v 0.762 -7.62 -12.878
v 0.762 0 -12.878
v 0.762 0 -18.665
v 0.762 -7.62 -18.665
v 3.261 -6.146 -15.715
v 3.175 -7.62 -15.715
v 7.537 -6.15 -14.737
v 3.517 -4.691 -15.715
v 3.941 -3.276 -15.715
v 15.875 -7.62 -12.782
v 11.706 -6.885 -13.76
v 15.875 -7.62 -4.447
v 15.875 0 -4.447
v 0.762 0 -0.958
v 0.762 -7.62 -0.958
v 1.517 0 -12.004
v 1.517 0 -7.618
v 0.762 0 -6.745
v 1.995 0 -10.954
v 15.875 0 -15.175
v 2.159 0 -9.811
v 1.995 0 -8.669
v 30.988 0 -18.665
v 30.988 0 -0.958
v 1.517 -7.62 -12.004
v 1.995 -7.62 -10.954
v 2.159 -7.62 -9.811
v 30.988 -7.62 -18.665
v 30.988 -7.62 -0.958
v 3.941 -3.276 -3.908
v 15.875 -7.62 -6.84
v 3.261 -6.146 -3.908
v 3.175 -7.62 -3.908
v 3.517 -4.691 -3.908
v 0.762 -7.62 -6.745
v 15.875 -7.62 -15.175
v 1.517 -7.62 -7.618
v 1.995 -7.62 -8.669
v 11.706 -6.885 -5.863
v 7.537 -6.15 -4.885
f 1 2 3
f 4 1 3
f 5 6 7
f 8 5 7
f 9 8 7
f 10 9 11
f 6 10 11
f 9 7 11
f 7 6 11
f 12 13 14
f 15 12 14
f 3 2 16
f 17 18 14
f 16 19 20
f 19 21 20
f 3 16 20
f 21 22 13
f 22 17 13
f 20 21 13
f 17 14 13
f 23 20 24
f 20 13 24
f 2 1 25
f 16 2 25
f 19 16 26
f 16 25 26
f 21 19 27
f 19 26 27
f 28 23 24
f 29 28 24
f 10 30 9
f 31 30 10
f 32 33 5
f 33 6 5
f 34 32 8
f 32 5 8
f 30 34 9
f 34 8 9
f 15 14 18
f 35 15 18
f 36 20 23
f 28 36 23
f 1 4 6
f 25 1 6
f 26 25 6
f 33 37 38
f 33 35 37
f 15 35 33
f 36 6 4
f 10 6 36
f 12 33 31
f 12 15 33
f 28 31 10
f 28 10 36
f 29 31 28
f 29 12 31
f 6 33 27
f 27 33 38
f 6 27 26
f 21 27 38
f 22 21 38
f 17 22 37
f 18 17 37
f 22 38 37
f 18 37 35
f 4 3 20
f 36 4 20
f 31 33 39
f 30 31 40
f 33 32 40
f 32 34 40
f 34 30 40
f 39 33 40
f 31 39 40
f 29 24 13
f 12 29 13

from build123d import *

# Parameters (mm, degrees)
F1_DEPTH = 7.62
F2_W     = 12.7
F2_H     = 5.9424509318
F3_ANGLE = 20
F5_DEPTH = 25.4
F7_DEPTH = 25.4


with BuildPart() as f1:
    # F0 (on Front) → F1 (new body)
    with BuildSketch(Plane.XZ):
        Polygon((15.875, -3.6650325341), (0, 0), (0, -19.622516), (15.875, -15.9574834659), align=None)
        Polygon((31.75, 0), (15.875, -3.6650325341), (15.875, -15.9574834659), (31.75, -19.622516), align=None)
    extrude(amount=F1_DEPTH)

    # F2 (on face) → F3 (revolve, cut)
    with BuildSketch(Plane.XZ.offset(7.62)):
        with Locations((9.525, -9.811258)):
            Rectangle(F2_W, F2_H)
        Polygon((15.875, -12.7824834659), (3.175, -12.7824834659), (3.175, -15.7145094932), align=None)
        Polygon((3.175, -3.9080065068), (3.175, -6.8400325341), (15.875, -6.8400325341), align=None)
    revolve(axis=Axis((15.875, -7.62, -9.811258), (0, 0, -1)), revolution_arc=F3_ANGLE, mode=Mode.SUBTRACT)

    # F4 (on face) → F5 (cut)
    with BuildSketch(Plane(origin=(0, 0, 0), x_dir=(-1, 0, 0), z_dir=(0, 1, 0))):
        Polygon((0, -19.622516), (0, 0), (-15.875, -3.6650325341), (-31.75, 0), (-31.75, -19.622516), (-15.875, -15.9574834659), align=None)
        Polygon((-15.875, -15.1754397357), (-30.988, -18.6645507082), (-30.988, -0.9579652918), (-15.875, -4.4470762643), (-0.762, -0.9579652918), (-0.762, -18.6645507082), align=None, mode=Mode.SUBTRACT)
    extrude(amount=-F5_DEPTH, mode=Mode.SUBTRACT)

    # F6 (on face) → F7 (cut)
    with BuildSketch(Plane.XZ.offset(7.62)):
        with BuildLine():
            Line((0.762, -9.811258), (0.762, -12.8777229028))
            ThreePointArc((0.762, -12.8777229028), (1.7932958238, -11.4961033935), (2.159, -9.811258))
            Line((2.159, -9.811258), (0.762, -9.811258))
        make_face()
        with BuildLine():
            Line((0.762, -6.7447930972), (0.762, -9.811258))
            Line((0.762, -9.811258), (2.159, -9.811258))
            ThreePointArc((2.159, -9.811258), (1.7932958238, -8.1264126065), (0.762, -6.7447930972))
        make_face()
    extrude(amount=-F7_DEPTH, mode=Mode.SUBTRACT)


solid = f1.part
